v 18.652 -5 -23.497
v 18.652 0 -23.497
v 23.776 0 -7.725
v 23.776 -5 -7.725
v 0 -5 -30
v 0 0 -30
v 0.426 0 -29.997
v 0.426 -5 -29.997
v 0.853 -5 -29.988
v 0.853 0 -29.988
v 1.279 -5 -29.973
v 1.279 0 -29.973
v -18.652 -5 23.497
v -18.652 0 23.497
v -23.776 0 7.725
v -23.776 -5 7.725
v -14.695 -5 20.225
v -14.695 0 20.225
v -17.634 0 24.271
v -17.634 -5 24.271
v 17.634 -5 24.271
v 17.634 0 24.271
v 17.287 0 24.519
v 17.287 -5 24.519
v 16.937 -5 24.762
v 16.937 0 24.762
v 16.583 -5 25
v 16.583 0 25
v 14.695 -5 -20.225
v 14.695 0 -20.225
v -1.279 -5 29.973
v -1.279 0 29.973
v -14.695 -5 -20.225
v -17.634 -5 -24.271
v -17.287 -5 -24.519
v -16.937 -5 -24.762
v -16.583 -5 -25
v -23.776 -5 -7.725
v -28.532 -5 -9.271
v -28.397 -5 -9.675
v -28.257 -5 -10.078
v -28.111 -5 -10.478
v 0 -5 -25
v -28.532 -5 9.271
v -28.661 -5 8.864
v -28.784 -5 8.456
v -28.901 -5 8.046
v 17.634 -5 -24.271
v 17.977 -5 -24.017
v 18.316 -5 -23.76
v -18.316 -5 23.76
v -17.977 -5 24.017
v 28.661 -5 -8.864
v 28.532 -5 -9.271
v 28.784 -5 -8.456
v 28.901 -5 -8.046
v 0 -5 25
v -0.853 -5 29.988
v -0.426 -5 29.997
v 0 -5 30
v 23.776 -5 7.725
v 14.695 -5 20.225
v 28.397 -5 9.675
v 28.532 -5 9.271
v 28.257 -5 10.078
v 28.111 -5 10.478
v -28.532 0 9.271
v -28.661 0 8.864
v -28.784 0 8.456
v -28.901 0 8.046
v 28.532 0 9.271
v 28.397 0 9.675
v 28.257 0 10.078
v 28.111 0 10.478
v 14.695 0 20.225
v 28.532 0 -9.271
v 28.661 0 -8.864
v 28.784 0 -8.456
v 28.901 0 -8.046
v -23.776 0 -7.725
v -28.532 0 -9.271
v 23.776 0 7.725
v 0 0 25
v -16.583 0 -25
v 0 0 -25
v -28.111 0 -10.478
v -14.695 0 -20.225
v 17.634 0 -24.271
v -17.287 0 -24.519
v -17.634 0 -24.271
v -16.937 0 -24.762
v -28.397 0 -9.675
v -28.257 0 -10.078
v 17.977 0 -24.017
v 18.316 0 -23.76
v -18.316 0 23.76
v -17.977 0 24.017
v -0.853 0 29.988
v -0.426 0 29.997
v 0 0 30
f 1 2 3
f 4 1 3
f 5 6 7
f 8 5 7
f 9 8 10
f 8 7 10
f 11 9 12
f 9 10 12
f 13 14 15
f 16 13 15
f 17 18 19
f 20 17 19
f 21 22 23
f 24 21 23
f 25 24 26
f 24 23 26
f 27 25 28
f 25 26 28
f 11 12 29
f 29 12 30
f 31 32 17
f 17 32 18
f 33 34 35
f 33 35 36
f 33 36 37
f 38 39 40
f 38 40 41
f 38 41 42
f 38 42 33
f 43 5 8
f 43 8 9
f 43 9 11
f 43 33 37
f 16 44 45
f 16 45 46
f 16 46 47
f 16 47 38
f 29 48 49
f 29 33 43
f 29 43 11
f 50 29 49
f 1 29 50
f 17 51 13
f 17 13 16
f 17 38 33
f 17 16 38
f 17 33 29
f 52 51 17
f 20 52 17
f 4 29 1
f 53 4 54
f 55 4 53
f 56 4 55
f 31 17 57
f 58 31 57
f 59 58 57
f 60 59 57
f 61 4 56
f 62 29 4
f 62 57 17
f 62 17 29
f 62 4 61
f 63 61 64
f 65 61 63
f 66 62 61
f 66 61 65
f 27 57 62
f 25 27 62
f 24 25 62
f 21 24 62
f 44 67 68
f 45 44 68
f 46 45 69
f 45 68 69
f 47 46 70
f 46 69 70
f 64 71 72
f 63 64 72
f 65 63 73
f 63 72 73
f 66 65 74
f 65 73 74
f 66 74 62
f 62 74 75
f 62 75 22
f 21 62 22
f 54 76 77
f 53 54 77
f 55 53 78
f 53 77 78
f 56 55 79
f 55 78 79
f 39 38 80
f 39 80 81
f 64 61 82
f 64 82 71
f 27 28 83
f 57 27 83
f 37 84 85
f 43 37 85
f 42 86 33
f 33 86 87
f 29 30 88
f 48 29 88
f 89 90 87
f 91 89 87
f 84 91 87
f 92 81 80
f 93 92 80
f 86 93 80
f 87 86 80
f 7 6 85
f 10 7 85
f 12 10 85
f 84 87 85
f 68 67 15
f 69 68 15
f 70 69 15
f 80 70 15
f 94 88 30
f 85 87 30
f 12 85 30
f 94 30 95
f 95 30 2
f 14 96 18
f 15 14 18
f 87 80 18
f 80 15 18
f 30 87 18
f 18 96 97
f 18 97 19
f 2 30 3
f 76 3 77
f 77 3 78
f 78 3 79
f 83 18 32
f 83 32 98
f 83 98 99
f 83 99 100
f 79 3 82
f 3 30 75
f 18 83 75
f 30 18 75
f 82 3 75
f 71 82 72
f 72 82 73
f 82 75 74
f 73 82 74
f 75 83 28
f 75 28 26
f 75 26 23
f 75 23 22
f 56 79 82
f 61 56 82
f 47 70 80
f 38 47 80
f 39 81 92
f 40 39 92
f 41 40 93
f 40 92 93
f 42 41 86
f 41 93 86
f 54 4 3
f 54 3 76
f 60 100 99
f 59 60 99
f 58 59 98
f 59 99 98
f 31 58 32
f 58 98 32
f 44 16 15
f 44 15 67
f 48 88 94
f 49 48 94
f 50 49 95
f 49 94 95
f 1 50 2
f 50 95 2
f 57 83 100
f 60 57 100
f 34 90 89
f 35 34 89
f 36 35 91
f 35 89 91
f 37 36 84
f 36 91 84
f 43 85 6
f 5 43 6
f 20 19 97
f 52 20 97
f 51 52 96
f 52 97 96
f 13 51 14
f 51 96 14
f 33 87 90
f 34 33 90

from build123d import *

# Parameters (mm, degrees)
F1_DEPTH = 5


with BuildPart() as f1:
    # F0 (on Front) → F1 (new body)
    with BuildSketch(Plane.XZ):
        with BuildLine():
            Line((23.776413, 7.725425), (28.531695, 9.27051))
            ThreePointArc((28.531695, 9.27051), (28.327614, 9.876553), (28.11066, 10.478109))
            Line((28.11066, 10.478109), (14.694631, 20.225425))
            Line((14.694631, 20.225425), (17.633558, 24.27051))
            ThreePointArc((17.633558, 24.27051), (17.112228, 24.640853), (16.583124, 25))
            Line((16.583124, 25), (0, 25))
            Line((0, 25), (0, 30))
            ThreePointArc((0, 30), (-0.639446, 29.993184), (-1.278602, 29.972741))
            Line((-1.278602, 29.972741), (-14.694631, 20.225425))
            Line((-14.694631, 20.225425), (-17.633558, 24.27051))
            ThreePointArc((-17.633558, 24.27051), (-18.146874, 23.889139), (-18.651946, 23.496913))
            Line((-18.651946, 23.496913), (-23.776413, 7.725425))
            Line((-23.776413, 7.725425), (-28.531695, 9.27051))
            ThreePointArc((-28.531695, 9.27051), (-28.722813, 8.660254), (-28.90088, 8.046063))
            Line((-28.90088, 8.046063), (-23.776413, -7.725425))
            Line((-23.776413, -7.725425), (-28.531695, -9.27051))
            ThreePointArc((-28.531695, -9.27051), (-28.327614, -9.876553), (-28.11066, -10.478109))
            Line((-28.11066, -10.478109), (-14.694631, -20.225425))
            Line((-14.694631, -20.225425), (-17.633558, -24.27051))
            ThreePointArc((-17.633558, -24.27051), (-17.112228, -24.640853), (-16.583124, -25))
            Line((-16.583124, -25), (0, -25))
            Line((0, -25), (0, -30))
            ThreePointArc((0, -30), (0.639446, -29.993184), (1.278602, -29.972741))
            Line((1.278602, -29.972741), (14.694631, -20.225425))
            Line((14.694631, -20.225425), (17.633558, -24.27051))
            ThreePointArc((17.633558, -24.27051), (18.146874, -23.889139), (18.651946, -23.496913))
            Line((18.651946, -23.496913), (23.776413, -7.725425))
            Line((23.776413, -7.725425), (28.531695, -9.27051))
            ThreePointArc((28.531695, -9.27051), (28.722813, -8.660254), (28.90088, -8.046063))
            Line((28.90088, -8.046063), (23.776413, 7.725425))
        make_face()
    extrude(amount=F1_DEPTH)


solid = f1.part
